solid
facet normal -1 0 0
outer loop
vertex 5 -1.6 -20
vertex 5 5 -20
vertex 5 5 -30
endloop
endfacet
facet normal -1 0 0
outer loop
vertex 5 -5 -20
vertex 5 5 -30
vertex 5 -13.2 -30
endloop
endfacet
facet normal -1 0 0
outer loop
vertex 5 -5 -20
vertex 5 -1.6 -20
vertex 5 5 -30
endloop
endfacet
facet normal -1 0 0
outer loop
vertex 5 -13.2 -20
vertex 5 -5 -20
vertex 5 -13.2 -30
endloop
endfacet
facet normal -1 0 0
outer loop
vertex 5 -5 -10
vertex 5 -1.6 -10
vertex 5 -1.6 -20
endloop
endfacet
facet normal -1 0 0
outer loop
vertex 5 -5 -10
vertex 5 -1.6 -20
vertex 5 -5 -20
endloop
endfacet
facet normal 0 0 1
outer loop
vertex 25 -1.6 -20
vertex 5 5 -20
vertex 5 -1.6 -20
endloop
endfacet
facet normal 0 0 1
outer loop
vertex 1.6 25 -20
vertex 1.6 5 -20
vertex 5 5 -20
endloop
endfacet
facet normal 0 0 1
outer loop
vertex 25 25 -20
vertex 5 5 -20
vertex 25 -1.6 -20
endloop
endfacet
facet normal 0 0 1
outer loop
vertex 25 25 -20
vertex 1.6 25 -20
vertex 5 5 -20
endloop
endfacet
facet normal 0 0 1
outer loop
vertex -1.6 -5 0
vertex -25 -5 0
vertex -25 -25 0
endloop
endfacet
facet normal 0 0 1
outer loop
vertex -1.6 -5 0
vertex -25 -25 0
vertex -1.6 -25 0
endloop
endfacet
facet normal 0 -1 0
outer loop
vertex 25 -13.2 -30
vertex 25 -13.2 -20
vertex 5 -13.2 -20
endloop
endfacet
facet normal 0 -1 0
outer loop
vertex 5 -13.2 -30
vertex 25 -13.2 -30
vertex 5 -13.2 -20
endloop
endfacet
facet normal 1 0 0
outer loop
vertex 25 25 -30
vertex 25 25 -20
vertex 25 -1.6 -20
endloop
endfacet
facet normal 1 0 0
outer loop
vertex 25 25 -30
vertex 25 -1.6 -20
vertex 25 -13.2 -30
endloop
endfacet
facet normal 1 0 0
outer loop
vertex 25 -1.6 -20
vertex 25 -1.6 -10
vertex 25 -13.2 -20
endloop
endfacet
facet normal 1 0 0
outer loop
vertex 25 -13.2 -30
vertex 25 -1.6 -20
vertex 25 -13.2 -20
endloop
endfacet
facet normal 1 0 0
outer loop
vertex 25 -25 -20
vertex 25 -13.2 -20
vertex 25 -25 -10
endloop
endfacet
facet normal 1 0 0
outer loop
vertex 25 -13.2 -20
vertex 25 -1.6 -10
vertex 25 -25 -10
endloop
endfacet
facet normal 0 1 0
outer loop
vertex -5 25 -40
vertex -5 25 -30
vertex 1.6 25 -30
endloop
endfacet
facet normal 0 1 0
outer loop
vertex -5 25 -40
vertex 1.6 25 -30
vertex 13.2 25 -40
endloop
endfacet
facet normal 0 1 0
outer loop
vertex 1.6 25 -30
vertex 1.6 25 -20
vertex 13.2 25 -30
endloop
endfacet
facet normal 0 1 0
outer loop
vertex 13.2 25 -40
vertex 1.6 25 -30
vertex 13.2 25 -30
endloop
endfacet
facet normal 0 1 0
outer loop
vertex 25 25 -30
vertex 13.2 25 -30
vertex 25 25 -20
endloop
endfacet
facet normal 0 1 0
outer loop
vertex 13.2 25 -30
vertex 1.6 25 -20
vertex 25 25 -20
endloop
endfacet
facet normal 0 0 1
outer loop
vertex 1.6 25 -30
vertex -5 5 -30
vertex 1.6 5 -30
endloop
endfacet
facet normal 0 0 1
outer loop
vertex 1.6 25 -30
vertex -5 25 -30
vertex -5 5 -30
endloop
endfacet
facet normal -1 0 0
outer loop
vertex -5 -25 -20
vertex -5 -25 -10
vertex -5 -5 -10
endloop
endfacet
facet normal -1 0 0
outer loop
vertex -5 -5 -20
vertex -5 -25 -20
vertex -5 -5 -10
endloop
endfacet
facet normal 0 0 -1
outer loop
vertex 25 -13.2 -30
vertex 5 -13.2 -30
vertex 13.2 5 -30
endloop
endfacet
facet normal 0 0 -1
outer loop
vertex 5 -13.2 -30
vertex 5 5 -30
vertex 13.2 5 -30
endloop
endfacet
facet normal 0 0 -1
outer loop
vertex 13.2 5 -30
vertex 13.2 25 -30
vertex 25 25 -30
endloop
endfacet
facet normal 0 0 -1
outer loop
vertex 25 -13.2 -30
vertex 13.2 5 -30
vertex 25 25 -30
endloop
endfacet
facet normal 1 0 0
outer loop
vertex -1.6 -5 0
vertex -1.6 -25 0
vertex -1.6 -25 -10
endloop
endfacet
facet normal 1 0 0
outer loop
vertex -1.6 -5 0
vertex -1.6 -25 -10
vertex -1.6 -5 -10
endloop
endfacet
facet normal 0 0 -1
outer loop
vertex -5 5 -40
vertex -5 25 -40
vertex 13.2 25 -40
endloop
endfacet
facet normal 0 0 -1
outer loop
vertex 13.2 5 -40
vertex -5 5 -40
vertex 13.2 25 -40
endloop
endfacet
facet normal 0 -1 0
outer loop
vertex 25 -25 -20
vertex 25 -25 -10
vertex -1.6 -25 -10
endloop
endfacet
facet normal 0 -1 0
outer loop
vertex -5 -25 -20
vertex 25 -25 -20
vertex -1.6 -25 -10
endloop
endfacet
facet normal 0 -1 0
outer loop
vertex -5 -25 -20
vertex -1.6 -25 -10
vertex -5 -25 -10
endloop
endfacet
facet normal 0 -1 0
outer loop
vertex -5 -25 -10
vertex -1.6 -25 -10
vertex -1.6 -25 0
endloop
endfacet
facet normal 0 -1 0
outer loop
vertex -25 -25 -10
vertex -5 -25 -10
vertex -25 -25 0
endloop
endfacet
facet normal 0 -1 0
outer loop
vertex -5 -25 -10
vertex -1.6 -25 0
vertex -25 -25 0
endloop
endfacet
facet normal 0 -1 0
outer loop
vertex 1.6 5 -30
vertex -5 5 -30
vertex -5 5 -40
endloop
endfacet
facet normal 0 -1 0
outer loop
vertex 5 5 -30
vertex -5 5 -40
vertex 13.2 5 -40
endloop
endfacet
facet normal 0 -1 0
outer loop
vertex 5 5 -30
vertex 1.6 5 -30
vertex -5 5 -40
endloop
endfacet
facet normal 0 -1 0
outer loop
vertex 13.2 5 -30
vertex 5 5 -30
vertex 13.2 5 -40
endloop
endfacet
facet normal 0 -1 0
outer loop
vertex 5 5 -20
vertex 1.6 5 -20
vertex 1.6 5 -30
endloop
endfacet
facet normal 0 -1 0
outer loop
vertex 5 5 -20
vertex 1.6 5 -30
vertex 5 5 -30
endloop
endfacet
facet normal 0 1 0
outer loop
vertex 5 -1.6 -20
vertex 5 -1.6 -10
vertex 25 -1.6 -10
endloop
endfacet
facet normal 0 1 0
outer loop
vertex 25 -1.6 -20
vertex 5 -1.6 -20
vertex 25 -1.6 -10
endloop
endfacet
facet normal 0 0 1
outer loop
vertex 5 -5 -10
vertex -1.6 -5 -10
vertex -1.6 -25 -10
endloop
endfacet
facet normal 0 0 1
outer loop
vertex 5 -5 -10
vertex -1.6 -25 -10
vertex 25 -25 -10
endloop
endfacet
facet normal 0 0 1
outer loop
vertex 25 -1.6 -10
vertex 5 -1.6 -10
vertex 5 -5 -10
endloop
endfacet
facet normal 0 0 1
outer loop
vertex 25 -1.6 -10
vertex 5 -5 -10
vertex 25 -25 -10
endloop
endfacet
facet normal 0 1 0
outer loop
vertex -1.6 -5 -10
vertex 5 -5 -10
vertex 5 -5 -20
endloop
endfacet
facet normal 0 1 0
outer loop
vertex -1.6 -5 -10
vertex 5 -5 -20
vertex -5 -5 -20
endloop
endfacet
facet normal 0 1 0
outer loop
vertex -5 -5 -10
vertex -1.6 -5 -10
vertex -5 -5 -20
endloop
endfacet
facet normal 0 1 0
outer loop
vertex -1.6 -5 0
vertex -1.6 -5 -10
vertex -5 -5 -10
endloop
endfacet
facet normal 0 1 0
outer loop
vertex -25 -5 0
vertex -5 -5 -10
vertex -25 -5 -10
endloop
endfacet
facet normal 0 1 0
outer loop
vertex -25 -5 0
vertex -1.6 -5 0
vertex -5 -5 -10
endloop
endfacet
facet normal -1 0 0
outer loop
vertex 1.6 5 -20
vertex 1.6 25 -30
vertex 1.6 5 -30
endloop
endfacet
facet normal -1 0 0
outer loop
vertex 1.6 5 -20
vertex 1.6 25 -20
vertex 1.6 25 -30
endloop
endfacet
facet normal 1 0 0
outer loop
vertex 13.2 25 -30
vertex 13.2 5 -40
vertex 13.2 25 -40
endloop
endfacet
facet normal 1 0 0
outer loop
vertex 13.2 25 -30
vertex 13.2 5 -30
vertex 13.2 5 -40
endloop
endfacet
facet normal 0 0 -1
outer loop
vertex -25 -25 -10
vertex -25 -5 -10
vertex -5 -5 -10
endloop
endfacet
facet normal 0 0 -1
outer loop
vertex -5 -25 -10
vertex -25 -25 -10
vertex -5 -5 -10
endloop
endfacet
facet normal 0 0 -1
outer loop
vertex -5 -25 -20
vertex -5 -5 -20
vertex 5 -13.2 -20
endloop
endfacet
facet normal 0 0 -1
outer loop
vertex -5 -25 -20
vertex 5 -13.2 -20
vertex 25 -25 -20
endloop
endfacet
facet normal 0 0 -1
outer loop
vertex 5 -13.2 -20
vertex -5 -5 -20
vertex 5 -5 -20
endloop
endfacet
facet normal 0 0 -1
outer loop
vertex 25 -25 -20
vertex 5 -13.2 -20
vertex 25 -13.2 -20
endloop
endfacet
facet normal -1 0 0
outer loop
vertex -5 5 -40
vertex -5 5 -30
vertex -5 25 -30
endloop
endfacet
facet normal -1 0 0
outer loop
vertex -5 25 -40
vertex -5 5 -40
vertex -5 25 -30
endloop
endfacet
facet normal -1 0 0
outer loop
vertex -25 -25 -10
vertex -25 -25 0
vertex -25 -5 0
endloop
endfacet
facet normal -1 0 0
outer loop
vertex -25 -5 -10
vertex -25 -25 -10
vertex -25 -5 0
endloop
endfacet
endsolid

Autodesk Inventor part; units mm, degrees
ref_plane "YZ Plane" through (0, 0, 0) normal (1, 0, 0) x (0, 1, 0)
ref_plane "XZ Plane" through (0, 0, 0) normal (0, 1, 0) x (-1, 0, 0)
ref_plane "XY Plane" through (0, 0, 0) normal (0, 0, 1) x (1, 0, 0)
sketch "草圖15" plane through (0, 0, 0) normal (0, 0, 1) x (1, 0, 0)
  line L0 (5, -5) -> (-5, -5)
  line L1 (-5, -5) -> (-5, 5)
  line L2 (-5, 5) -> (5, 5)
  line L3 (5, 5) -> (5, -5)
  line L4 (5, -5) -> (-5, 5) construction
  line L5 (-5, -5) -> (5, 5) construction
  line L6 (25, -25) -> (-25, -25)
  line L7 (-25, -25) -> (-25, 25)
  line L8 (-25, 25) -> (25, 25)
  line L9 (25, 25) -> (25, -25)
  line L10 (25, -25) -> (-25, 25) construction
  line L11 (-25, -25) -> (25, 25) construction
  line L12 (-25, -25) -> (-1.6, -25)
  line L13 (-1.6, -25) -> (-1.6, -5)
  line L14 (-1.6, -5) -> (-25, -5)
  line L15 (-25, -5) -> (-25, -25)
  line L16 (25, -25) -> (-1.6, -25)
  line L17 (-1.6, -5) -> (25, -5)
  line L18 (25, -5) -> (25, -25)
  line L19 (25, -25) -> (5, -25)
  line L20 (5, -25) -> (5, -1.6)
  line L21 (5, -1.6) -> (25, -1.6)
  line L22 (25, -1.6) -> (25, -25)
  line L23 (25, 25) -> (5, 25)
  line L24 (5, 25) -> (5, -1.6)
  line L25 (25, -1.6) -> (25, 25)
  line L26 (25, 25) -> (1.6, 25)
  line L27 (1.6, 25) -> (1.6, 5)
  line L28 (1.6, 5) -> (25, 5)
  line L29 (25, 5) -> (25, 25)
  line L30 (-25, 25) -> (1.6, 25)
  line L31 (1.6, 5) -> (-25, 5)
  line L32 (-25, 5) -> (-25, 25)
  line L33 (-5, -5) -> (-25, -5)
  line L34 (-25, -5) -> (-25, -25)
  line L35 (-25, -25) -> (-5, -25)
  line L36 (-5, -25) -> (-5, -5)
  line L37 (-1.6, -25) -> (-13.2, -25)
  line L38 (-13.2, -25) -> (-13.2, -5)
  line L39 (-13.2, -5) -> (-1.6, -5)
  line L40 (-1.6, -5) -> (-1.6, -25)
  line L41 (5, -1.6) -> (25, -1.6)
  line L42 (25, -1.6) -> (25, -13.2)
  line L43 (25, -13.2) -> (5, -13.2)
  line L44 (5, -13.2) -> (5, -1.6)
  line L45 (1.6, 5) -> (13.2, 5)
  line L46 (13.2, 5) -> (13.2, 25)
  line L47 (13.2, 25) -> (1.6, 25)
  line L48 (1.6, 25) -> (1.6, 5)
  line L49 (1.6, 5) -> (-5, 5)
  line L50 (-5, 5) -> (-5, 25)
  line L51 (-5, 25) -> (1.6, 25)
  line L52 (1.6, 25) -> (1.6, 5)
  point P0 (0, 0)
  point P1 (0, 0)
  point P2 (-1.6, -25)
  point P3 (-25, 5)
  point P4 (-5, 5)
  point P5 (-5, -25)
  point P6 (5, 5)
  point P7 (-5, -25)
  point P8 (-13.2, -25)
  point P9 (25, -13.2)
  point P10 (-5, 25)
  point P11 (-5, 5)
  point P12 (5, 5)
  point P13 (13.2, 5)
  point P14 (13.2, 25)
  dimension "d38" = 10
  dimension "d39" = 20
  dimension "d40" = 1.6
  dimension "d42" = 1.6
  dimension "d48" = 1.6
  dimension "d54" = 0
  dimension "d55" = 11.6
  dimension "d56" = 11.6
  dimension "d57" = 11.6
  dimension "d58" = 10
extrude "擠出10" add sketch "草圖15" against normal blind 10 contours L13 L6 L36 L0 | L36 L6 L38 L14 | L38 L6 L7 L14
extrude "擠出11" add sketch "草圖15" against normal blind 10 from surface at -10 contours L20 L6 L13 L0 | L3 L21 L9 L17 | L17 L9 L43 L20 | L13 L6 L36 L0 | L43 L9 L6 L20
extrude "擠出12" add sketch "草圖15" against normal blind 10 from surface at -20 contours L3 L21 L9 L17 | L17 L9 L43 L20 | L3 L28 L9 L21 | L2 L27 L8 L24 | L24 L8 L46 L28 | L46 L8 L9 L28
extrude "擠出13" add sketch "草圖15" against normal blind 10 from surface at -30 contours L2 L27 L8 L24 | L24 L8 L46 L28 | L50 L8 L27 L2
equation "\"d39\" = width"
equation "\"d40\" = gap"
equation "\"d42\" = gap"
equation "\"d48\" = gap"
equation "\"d55\" = stack"
equation "\"d56\" = stack"
equation "\"d57\" = stack"
equation "\"d44\" = height"
equation "\"d46\" = height"
equation "\"d50\" = height"
equation "\"d52\" = height"
equation "\"width\" = 20"
equation "\"height\" = 10"
equation "\"gap\" = 1.6"
equation "\"stack\" = 11.6"
properties part number "Template_ladder_2"
